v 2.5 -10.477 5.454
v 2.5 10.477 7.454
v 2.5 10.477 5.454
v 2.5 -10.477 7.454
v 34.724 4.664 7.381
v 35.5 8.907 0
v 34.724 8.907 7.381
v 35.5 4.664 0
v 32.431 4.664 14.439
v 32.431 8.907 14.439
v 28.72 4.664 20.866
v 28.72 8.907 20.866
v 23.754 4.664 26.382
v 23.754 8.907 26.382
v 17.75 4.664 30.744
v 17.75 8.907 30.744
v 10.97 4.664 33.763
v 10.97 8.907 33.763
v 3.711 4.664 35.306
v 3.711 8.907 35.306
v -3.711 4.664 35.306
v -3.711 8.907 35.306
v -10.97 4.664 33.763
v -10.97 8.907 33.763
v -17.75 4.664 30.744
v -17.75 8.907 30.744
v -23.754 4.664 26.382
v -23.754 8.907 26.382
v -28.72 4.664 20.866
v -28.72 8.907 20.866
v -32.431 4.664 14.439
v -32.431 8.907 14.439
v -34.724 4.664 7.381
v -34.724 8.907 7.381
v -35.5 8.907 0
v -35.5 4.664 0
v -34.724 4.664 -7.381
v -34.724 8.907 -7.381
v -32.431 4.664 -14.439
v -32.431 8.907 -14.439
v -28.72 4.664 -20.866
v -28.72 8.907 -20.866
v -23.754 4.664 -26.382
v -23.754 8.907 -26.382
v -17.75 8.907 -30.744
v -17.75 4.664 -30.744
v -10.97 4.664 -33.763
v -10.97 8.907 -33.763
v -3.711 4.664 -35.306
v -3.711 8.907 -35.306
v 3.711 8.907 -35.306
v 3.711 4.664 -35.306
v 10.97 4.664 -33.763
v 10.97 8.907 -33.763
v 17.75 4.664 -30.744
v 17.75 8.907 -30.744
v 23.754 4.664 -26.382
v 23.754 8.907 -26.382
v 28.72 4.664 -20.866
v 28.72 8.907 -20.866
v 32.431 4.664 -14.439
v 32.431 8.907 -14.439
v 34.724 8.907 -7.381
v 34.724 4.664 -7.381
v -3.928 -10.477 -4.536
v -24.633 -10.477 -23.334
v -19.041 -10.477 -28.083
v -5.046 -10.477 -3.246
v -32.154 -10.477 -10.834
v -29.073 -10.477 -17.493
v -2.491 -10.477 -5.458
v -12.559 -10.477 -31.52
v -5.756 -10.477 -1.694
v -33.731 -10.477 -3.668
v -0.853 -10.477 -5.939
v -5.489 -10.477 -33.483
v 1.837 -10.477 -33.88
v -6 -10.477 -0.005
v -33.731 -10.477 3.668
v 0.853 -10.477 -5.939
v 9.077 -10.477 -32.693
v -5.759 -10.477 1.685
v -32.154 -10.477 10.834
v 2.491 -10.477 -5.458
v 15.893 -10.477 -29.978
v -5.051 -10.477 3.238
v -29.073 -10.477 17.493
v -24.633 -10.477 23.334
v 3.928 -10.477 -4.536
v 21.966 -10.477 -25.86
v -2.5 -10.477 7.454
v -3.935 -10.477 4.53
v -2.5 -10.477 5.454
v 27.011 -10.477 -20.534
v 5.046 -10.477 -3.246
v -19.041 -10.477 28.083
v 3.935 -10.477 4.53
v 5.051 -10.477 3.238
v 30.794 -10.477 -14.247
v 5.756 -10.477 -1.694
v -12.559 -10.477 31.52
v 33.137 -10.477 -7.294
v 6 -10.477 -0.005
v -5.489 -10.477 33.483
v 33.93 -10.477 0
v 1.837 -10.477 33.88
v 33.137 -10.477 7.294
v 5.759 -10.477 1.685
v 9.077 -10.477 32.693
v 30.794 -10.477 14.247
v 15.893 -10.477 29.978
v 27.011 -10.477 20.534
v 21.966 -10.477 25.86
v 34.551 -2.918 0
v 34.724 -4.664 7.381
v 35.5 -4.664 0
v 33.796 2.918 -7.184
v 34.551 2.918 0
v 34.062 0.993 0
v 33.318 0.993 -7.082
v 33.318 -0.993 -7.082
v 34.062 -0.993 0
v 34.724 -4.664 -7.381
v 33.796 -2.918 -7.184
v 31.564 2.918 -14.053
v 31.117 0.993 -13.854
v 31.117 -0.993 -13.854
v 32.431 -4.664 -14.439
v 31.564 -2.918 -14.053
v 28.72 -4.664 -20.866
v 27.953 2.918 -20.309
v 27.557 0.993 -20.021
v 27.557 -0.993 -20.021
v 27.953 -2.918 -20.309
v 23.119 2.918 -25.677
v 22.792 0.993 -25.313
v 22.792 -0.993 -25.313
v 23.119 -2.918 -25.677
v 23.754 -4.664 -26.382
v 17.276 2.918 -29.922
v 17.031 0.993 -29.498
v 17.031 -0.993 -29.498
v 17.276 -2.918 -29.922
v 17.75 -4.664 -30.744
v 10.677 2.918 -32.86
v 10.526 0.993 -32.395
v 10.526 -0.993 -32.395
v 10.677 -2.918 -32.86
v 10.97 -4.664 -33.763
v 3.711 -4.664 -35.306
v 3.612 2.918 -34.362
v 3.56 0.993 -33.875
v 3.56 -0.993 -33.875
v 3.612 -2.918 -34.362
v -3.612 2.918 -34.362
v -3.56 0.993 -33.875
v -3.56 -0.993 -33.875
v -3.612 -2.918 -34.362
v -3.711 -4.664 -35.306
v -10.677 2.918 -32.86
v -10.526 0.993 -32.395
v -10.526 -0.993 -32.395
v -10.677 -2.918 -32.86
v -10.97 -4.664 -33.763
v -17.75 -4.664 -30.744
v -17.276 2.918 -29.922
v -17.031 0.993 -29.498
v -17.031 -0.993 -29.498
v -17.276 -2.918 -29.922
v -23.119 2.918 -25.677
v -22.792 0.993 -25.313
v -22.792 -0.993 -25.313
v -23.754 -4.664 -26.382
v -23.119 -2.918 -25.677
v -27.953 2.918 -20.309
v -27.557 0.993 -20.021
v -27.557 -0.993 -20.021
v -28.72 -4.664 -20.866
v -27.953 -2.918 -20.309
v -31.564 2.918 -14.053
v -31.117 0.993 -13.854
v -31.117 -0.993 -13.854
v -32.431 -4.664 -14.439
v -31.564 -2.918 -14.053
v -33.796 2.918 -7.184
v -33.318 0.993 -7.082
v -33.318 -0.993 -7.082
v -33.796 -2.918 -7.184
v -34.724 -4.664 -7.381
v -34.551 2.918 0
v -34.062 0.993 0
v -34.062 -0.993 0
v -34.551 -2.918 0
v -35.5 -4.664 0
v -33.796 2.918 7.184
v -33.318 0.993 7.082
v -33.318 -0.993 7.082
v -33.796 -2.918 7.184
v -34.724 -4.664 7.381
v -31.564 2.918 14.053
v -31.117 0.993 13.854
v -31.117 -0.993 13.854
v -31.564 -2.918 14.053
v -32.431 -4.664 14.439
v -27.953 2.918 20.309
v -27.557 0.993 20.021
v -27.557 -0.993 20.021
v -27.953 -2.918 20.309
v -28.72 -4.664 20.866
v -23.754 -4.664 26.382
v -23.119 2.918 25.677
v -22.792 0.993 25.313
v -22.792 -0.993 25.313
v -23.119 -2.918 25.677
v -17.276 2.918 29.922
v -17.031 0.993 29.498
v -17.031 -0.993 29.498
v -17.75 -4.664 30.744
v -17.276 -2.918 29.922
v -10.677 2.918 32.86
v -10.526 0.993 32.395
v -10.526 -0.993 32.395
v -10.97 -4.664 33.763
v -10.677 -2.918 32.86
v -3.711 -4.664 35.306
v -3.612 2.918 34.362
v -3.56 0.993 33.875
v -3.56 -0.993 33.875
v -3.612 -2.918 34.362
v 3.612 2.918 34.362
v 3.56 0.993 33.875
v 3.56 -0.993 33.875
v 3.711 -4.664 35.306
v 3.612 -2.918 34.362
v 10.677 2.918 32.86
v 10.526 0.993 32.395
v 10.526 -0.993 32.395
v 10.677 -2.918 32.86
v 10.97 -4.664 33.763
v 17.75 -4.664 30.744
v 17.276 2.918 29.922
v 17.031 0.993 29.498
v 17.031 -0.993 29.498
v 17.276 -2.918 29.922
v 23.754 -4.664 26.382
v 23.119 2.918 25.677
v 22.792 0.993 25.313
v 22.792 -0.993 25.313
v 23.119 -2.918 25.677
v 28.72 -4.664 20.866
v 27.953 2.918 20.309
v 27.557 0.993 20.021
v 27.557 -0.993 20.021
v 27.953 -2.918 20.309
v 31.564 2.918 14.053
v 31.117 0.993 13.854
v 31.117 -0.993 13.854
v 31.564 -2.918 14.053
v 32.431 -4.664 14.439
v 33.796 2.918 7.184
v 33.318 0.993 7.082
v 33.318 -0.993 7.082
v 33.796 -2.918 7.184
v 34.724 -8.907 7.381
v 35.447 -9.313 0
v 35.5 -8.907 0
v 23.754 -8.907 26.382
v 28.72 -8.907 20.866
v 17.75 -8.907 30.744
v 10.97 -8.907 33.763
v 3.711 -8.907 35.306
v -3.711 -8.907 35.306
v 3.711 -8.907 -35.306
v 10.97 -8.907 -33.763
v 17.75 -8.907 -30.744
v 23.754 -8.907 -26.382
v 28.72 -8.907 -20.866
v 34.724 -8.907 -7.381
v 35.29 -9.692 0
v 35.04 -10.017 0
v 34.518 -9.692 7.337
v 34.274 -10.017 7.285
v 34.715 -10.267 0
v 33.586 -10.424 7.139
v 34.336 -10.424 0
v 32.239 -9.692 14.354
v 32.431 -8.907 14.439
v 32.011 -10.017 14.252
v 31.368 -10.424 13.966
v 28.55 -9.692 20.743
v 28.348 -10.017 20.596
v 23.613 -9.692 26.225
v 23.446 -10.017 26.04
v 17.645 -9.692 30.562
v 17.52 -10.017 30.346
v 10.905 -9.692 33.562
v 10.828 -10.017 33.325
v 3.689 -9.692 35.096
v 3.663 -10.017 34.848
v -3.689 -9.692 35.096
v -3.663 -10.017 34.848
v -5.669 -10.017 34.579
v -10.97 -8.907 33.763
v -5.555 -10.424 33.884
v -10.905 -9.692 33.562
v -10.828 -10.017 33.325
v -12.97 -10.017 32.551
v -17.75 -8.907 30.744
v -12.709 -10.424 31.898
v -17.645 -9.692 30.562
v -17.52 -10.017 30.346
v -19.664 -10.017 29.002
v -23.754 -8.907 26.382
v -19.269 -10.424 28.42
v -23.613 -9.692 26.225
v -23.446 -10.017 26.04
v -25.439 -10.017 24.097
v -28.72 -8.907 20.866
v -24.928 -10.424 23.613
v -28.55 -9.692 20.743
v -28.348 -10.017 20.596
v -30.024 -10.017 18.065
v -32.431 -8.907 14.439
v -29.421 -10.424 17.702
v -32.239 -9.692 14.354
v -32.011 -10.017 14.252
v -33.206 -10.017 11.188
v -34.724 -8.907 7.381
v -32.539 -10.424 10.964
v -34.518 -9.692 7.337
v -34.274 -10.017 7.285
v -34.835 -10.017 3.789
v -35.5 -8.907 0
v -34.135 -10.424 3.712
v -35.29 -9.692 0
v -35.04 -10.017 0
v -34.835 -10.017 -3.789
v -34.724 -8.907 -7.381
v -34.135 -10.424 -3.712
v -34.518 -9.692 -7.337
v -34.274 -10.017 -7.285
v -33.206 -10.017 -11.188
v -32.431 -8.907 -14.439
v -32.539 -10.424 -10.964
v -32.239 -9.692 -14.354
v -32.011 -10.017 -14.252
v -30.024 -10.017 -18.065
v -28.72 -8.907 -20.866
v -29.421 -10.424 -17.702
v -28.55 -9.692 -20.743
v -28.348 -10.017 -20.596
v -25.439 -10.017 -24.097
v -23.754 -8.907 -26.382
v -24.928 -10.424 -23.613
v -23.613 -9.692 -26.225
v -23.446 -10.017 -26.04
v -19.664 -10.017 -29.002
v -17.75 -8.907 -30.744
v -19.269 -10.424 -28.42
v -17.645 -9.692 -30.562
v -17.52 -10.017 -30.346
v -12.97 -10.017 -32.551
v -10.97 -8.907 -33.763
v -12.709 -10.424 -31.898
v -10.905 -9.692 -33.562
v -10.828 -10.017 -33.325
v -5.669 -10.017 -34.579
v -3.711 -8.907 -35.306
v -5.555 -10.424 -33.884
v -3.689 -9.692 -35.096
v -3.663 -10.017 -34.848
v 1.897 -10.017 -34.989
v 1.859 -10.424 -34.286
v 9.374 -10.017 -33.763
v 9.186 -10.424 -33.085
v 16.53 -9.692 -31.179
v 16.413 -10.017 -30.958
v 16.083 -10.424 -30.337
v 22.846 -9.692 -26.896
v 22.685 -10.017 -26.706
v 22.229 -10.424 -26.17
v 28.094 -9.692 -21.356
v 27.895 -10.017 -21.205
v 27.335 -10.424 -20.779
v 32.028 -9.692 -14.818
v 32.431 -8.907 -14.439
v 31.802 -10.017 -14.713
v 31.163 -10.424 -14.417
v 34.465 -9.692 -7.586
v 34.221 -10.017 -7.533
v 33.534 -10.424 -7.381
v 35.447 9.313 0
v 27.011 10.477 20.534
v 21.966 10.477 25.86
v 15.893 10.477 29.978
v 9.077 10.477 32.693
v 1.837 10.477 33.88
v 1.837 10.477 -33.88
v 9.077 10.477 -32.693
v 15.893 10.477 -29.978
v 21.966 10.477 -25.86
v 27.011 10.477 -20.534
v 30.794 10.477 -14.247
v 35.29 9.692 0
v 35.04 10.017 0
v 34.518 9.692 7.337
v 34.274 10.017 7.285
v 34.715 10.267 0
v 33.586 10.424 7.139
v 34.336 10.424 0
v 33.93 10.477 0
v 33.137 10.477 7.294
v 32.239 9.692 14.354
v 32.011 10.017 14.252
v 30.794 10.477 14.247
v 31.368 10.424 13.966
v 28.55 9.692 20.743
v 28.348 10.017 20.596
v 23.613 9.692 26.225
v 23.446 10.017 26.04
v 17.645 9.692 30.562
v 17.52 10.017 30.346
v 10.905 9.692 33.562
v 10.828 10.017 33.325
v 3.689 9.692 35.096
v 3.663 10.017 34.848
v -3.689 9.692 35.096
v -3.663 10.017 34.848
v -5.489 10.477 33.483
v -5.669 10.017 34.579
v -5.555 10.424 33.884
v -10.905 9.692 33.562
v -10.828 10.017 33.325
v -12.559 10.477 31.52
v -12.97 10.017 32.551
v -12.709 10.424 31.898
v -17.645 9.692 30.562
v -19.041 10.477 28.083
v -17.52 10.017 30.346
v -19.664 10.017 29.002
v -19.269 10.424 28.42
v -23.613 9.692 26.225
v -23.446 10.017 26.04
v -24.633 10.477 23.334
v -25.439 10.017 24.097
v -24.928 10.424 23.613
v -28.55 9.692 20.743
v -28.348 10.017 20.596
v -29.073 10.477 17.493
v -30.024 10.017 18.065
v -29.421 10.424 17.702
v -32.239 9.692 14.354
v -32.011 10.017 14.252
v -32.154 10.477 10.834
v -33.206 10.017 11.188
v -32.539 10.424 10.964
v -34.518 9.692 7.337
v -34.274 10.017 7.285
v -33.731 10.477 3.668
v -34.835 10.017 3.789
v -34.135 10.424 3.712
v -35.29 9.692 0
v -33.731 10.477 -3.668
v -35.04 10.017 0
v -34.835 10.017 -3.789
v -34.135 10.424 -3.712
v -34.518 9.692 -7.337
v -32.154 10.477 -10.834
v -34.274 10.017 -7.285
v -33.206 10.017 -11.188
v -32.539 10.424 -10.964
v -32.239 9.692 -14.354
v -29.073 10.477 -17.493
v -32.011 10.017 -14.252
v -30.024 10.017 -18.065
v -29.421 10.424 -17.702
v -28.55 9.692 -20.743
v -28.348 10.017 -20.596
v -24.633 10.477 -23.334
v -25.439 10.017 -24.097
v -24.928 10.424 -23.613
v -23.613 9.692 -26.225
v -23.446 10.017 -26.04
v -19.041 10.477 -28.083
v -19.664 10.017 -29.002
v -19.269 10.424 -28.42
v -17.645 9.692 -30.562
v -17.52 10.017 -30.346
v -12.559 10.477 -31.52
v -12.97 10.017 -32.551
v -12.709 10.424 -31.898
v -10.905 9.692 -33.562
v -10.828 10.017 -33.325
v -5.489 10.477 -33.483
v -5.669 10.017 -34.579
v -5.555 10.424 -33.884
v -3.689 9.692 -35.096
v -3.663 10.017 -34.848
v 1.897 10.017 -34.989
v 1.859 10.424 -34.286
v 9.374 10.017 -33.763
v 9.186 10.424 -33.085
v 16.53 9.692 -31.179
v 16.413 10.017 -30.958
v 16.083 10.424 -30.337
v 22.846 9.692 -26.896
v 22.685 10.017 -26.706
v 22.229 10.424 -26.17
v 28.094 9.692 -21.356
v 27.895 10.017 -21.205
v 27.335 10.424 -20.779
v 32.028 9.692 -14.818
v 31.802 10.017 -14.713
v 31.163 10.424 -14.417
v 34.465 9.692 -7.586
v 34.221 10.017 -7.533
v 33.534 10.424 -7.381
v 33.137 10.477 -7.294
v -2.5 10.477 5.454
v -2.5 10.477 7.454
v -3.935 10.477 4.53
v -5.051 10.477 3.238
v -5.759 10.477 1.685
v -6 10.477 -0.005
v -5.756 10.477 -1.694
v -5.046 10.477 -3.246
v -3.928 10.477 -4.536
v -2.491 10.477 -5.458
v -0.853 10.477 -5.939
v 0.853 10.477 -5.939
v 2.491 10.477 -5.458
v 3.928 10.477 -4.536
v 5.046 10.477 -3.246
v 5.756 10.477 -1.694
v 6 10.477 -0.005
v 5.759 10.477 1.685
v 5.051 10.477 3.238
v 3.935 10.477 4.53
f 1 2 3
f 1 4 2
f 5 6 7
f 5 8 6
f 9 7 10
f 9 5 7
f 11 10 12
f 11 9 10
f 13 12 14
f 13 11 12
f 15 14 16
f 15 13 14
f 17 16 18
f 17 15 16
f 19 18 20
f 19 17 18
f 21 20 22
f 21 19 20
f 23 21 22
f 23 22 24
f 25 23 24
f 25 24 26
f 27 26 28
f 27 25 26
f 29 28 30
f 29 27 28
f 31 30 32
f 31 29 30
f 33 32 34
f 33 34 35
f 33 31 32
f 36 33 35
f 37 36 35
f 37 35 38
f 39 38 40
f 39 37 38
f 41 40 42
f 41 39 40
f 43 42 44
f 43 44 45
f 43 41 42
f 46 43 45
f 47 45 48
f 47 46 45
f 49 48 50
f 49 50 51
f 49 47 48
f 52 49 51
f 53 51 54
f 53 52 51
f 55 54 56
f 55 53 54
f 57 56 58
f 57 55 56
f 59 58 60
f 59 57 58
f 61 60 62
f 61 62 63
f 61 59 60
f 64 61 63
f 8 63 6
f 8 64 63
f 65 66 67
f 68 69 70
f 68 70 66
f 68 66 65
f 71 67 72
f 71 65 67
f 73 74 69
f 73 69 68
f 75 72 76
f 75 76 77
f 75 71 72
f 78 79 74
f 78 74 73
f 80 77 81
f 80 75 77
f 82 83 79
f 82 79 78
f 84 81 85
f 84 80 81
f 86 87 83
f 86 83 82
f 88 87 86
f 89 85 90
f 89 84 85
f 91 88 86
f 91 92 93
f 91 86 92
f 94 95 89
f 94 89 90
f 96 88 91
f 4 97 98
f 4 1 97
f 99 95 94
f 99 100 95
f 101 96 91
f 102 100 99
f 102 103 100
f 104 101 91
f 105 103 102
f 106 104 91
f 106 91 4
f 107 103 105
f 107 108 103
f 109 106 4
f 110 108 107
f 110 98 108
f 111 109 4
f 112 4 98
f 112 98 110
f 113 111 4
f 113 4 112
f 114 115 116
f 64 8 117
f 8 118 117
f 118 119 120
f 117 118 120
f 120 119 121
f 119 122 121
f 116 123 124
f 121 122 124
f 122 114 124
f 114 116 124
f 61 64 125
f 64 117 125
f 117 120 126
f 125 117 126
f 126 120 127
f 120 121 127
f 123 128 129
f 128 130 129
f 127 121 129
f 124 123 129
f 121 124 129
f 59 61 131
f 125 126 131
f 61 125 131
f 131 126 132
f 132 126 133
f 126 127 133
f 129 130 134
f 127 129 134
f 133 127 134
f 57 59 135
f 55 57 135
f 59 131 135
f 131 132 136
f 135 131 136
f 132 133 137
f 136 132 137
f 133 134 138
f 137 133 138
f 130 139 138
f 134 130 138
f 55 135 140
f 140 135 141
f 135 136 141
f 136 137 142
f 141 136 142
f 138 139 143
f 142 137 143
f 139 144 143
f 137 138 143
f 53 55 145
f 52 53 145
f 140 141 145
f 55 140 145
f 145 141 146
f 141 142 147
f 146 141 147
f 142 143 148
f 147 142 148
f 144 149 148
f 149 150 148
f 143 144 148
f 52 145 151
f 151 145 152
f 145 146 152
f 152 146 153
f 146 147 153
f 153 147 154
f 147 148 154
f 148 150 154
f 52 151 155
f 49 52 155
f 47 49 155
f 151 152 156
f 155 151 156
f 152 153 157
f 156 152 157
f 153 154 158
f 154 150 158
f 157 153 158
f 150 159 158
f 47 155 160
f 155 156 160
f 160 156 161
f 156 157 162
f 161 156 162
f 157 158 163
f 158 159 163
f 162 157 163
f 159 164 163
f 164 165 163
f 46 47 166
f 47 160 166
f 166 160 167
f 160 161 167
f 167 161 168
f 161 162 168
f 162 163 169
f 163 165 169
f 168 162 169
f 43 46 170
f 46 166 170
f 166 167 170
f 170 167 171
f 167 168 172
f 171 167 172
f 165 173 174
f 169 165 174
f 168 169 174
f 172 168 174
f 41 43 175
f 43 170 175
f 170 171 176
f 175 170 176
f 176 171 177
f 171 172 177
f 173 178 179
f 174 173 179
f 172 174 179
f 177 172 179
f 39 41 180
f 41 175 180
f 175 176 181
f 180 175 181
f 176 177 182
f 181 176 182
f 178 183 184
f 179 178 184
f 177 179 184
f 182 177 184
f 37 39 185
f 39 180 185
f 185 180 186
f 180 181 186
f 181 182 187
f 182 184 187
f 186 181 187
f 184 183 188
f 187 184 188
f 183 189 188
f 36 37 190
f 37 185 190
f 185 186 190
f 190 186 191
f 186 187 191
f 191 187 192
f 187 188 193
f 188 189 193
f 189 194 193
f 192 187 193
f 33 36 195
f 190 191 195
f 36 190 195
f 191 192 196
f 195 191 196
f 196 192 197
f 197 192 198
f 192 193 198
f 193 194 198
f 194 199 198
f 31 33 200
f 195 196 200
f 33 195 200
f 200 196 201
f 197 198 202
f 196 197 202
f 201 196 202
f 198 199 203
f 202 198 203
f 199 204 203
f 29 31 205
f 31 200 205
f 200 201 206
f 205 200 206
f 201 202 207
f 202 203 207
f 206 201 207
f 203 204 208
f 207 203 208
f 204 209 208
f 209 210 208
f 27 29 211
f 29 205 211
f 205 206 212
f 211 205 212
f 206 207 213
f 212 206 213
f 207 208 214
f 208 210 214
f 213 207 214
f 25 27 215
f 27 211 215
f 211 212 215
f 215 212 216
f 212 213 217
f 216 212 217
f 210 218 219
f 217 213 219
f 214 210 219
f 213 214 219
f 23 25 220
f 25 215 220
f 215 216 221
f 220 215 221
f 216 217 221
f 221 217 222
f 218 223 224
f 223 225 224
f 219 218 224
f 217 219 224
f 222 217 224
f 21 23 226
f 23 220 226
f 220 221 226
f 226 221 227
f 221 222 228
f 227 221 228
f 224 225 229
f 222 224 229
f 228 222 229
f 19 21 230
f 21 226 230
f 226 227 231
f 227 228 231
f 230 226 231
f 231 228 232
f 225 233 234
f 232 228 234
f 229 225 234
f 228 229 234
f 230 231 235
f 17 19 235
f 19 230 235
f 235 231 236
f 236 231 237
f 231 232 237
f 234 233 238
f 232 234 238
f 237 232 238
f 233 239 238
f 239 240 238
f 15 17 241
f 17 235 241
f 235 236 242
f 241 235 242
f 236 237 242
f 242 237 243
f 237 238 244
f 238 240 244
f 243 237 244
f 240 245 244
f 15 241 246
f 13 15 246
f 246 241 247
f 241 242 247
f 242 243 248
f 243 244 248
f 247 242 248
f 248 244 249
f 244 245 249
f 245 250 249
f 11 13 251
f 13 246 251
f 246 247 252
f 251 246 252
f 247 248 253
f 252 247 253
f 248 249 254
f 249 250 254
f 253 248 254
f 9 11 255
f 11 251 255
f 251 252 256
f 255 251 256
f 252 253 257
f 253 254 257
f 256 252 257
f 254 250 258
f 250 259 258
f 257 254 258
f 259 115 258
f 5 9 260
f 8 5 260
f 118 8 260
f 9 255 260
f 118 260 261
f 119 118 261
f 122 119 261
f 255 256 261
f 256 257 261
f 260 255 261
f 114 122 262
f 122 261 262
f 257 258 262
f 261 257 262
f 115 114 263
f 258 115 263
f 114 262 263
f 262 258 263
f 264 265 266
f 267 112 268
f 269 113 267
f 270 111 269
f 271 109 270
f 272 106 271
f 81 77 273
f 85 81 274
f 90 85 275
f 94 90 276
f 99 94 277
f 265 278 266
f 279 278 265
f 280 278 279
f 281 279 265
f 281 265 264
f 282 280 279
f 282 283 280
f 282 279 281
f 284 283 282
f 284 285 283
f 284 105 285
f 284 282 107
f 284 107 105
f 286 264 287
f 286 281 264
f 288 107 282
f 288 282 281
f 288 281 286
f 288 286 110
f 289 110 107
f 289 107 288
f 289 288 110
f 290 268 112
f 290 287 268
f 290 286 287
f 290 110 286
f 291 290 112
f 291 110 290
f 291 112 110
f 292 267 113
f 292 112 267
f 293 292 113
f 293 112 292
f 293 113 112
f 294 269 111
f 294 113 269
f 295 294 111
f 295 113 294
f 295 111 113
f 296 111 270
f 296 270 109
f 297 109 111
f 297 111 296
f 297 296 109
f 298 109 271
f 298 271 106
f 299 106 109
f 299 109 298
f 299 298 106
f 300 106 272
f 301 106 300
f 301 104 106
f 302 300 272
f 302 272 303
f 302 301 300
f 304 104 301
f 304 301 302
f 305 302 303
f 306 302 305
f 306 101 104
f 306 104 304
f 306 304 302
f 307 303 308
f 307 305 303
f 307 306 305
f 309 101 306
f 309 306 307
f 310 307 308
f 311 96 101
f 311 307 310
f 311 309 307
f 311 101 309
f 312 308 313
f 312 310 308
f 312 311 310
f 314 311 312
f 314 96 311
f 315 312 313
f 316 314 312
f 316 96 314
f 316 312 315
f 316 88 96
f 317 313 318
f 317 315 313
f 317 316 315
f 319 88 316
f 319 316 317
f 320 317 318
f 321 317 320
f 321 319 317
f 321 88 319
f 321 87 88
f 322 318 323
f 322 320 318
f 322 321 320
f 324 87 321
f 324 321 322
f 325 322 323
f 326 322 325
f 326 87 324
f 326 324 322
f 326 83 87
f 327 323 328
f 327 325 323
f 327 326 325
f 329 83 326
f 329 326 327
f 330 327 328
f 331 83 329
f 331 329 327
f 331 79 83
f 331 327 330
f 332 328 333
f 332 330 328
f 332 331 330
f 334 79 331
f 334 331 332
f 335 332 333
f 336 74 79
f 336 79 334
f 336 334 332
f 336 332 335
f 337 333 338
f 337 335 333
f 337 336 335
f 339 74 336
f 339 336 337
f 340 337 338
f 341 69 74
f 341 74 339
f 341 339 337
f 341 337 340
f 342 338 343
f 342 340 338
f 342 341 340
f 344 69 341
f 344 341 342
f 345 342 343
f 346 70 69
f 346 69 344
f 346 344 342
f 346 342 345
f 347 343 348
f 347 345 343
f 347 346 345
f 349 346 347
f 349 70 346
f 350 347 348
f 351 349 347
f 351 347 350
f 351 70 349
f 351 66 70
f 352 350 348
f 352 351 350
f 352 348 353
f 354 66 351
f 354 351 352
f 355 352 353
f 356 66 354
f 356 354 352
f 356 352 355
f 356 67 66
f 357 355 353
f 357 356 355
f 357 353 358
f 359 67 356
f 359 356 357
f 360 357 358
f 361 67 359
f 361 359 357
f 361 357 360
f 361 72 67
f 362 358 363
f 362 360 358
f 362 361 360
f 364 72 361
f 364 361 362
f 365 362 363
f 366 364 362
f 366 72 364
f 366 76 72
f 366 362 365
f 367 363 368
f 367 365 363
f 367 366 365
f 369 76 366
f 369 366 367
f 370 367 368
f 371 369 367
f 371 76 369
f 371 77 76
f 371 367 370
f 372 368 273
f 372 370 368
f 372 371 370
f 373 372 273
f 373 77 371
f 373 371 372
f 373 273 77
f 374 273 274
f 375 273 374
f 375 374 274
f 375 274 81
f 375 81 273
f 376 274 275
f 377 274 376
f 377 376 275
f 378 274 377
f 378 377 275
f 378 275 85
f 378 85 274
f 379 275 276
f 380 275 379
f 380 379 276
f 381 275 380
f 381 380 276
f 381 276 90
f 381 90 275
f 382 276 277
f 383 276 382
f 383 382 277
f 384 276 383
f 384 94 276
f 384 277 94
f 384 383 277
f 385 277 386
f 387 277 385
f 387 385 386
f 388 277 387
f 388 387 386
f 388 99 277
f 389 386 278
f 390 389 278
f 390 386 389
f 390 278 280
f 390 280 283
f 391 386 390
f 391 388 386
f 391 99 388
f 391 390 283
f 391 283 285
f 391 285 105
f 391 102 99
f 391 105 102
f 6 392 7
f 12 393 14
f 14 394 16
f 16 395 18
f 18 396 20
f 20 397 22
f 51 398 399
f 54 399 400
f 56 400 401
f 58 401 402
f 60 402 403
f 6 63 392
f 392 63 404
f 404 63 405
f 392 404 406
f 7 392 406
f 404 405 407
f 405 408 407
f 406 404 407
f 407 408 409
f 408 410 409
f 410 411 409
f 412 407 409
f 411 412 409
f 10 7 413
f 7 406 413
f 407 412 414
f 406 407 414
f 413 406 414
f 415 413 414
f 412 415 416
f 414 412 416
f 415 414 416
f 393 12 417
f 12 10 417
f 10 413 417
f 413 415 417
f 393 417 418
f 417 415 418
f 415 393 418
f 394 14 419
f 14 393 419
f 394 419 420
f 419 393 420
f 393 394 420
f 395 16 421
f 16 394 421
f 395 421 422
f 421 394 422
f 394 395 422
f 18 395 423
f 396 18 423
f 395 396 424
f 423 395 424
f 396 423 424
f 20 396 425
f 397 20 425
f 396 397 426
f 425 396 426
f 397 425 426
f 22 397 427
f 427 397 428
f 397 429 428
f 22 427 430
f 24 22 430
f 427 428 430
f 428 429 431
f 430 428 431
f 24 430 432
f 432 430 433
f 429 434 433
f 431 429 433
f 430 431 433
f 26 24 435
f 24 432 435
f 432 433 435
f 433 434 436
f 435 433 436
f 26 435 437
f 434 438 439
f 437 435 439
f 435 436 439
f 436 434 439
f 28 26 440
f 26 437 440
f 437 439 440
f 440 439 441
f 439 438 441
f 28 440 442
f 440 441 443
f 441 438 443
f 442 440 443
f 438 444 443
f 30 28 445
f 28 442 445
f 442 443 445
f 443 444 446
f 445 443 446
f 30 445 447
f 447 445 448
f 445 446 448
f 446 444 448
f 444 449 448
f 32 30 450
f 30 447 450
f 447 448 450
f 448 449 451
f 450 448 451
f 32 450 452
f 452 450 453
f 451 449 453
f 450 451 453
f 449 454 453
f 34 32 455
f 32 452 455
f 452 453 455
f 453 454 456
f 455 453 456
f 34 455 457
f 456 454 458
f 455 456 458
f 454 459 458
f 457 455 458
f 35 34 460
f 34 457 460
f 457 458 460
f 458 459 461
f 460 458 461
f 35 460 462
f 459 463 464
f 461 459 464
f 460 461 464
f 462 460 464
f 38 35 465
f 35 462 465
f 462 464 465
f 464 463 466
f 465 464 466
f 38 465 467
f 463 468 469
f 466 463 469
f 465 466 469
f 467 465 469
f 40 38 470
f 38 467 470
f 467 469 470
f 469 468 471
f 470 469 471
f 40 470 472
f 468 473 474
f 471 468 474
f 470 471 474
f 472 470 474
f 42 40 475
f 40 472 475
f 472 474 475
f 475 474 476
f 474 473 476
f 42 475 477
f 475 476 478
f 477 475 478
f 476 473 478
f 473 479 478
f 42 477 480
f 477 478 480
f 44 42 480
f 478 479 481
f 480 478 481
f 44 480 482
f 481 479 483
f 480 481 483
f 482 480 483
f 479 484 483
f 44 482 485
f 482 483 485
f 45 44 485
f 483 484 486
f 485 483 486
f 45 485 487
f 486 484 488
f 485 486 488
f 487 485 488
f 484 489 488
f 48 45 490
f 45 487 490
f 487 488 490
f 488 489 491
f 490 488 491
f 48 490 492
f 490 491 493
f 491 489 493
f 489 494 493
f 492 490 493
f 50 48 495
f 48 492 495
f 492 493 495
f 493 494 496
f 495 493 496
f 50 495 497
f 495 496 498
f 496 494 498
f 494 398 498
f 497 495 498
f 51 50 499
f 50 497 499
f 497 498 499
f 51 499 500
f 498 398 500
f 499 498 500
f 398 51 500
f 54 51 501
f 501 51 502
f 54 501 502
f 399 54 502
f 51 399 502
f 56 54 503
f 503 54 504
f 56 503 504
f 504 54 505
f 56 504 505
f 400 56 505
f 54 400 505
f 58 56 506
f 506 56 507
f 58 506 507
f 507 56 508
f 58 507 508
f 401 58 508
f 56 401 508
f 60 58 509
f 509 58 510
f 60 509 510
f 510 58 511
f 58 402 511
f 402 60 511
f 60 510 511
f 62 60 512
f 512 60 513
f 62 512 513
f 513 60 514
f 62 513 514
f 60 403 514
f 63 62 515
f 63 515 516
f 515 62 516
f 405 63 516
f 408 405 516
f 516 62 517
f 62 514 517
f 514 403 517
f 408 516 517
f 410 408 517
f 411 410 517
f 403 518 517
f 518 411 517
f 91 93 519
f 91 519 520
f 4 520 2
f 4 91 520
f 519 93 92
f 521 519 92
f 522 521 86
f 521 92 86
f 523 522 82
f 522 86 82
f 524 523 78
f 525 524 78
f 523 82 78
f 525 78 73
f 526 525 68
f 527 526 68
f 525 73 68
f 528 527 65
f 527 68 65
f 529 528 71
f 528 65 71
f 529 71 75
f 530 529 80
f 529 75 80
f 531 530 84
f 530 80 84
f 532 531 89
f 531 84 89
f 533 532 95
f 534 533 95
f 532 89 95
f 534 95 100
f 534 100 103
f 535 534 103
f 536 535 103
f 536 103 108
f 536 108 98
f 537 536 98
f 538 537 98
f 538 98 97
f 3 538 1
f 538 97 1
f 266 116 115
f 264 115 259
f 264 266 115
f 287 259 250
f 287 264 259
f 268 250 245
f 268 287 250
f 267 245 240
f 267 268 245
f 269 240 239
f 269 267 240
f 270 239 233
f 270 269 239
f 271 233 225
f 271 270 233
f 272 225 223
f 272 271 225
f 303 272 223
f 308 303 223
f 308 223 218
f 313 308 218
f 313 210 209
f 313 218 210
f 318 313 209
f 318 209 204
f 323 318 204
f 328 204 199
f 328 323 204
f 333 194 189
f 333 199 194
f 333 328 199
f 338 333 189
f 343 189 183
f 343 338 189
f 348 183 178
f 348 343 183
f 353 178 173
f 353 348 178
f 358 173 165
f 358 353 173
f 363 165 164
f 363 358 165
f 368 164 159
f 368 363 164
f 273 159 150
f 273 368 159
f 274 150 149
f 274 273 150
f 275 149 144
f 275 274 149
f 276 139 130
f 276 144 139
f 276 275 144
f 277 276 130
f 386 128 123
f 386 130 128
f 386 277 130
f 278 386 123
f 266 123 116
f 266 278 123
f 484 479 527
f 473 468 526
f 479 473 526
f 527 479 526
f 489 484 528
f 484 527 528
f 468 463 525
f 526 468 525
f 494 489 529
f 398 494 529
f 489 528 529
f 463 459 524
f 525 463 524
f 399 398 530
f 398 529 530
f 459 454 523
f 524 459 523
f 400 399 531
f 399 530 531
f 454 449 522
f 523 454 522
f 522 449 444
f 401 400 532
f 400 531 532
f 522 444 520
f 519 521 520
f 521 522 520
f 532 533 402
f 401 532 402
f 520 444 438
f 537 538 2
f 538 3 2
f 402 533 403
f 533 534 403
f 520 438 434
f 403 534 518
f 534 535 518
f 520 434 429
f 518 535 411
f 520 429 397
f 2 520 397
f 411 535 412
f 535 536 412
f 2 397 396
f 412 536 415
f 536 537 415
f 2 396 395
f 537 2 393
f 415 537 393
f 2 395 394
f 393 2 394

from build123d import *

# Parameters (mm, degrees)
SKETCH002_R  = 35.5
PAD001_DEPTH = 10.477
FILLET_R     = 1.57
FILLET001_R  = 1.57
SKETCH003_R  = 8


with BuildPart() as part:
    # Sketch002 → Pad001 (new body, symmetric)
    with BuildSketch(Plane.XZ):
        Circle(SKETCH002_R)
        with BuildLine():
            ThreePointArc((-2.5, 5.454356), (0, -6), (2.5, 5.454356))
            Line((2.5, 7.454356), (2.5, 5.454356))
            Line((-2.5, 7.454356), (2.5, 7.454356))
            Line((-2.5, 5.454356), (-2.5, 7.454356))
        make_face(mode=Mode.SUBTRACT)
    extrude(amount=PAD001_DEPTH, both=True)

    # Fillet
    fillet_edges = [part.edges().sort_by_distance(p)[0] for p in [
        (-35.5, 10.477, 0),
    ]]
    fillet(fillet_edges, radius=FILLET_R)

    # Fillet001
    fillet001_edges = [part.edges().sort_by_distance(p)[0] for p in [
        (-35.5, -10.477, 0),
    ]]
    fillet(fillet001_edges, radius=FILLET001_R)

    # Sketch003 → Groove (revolve, cut)
    with BuildSketch(Plane.XY):
        with Locations((42, 0)):
            Circle(SKETCH003_R)
    revolve(axis=Axis((0, 0, 0), (0, 1, 0)), mode=Mode.SUBTRACT)


solid = part.part
